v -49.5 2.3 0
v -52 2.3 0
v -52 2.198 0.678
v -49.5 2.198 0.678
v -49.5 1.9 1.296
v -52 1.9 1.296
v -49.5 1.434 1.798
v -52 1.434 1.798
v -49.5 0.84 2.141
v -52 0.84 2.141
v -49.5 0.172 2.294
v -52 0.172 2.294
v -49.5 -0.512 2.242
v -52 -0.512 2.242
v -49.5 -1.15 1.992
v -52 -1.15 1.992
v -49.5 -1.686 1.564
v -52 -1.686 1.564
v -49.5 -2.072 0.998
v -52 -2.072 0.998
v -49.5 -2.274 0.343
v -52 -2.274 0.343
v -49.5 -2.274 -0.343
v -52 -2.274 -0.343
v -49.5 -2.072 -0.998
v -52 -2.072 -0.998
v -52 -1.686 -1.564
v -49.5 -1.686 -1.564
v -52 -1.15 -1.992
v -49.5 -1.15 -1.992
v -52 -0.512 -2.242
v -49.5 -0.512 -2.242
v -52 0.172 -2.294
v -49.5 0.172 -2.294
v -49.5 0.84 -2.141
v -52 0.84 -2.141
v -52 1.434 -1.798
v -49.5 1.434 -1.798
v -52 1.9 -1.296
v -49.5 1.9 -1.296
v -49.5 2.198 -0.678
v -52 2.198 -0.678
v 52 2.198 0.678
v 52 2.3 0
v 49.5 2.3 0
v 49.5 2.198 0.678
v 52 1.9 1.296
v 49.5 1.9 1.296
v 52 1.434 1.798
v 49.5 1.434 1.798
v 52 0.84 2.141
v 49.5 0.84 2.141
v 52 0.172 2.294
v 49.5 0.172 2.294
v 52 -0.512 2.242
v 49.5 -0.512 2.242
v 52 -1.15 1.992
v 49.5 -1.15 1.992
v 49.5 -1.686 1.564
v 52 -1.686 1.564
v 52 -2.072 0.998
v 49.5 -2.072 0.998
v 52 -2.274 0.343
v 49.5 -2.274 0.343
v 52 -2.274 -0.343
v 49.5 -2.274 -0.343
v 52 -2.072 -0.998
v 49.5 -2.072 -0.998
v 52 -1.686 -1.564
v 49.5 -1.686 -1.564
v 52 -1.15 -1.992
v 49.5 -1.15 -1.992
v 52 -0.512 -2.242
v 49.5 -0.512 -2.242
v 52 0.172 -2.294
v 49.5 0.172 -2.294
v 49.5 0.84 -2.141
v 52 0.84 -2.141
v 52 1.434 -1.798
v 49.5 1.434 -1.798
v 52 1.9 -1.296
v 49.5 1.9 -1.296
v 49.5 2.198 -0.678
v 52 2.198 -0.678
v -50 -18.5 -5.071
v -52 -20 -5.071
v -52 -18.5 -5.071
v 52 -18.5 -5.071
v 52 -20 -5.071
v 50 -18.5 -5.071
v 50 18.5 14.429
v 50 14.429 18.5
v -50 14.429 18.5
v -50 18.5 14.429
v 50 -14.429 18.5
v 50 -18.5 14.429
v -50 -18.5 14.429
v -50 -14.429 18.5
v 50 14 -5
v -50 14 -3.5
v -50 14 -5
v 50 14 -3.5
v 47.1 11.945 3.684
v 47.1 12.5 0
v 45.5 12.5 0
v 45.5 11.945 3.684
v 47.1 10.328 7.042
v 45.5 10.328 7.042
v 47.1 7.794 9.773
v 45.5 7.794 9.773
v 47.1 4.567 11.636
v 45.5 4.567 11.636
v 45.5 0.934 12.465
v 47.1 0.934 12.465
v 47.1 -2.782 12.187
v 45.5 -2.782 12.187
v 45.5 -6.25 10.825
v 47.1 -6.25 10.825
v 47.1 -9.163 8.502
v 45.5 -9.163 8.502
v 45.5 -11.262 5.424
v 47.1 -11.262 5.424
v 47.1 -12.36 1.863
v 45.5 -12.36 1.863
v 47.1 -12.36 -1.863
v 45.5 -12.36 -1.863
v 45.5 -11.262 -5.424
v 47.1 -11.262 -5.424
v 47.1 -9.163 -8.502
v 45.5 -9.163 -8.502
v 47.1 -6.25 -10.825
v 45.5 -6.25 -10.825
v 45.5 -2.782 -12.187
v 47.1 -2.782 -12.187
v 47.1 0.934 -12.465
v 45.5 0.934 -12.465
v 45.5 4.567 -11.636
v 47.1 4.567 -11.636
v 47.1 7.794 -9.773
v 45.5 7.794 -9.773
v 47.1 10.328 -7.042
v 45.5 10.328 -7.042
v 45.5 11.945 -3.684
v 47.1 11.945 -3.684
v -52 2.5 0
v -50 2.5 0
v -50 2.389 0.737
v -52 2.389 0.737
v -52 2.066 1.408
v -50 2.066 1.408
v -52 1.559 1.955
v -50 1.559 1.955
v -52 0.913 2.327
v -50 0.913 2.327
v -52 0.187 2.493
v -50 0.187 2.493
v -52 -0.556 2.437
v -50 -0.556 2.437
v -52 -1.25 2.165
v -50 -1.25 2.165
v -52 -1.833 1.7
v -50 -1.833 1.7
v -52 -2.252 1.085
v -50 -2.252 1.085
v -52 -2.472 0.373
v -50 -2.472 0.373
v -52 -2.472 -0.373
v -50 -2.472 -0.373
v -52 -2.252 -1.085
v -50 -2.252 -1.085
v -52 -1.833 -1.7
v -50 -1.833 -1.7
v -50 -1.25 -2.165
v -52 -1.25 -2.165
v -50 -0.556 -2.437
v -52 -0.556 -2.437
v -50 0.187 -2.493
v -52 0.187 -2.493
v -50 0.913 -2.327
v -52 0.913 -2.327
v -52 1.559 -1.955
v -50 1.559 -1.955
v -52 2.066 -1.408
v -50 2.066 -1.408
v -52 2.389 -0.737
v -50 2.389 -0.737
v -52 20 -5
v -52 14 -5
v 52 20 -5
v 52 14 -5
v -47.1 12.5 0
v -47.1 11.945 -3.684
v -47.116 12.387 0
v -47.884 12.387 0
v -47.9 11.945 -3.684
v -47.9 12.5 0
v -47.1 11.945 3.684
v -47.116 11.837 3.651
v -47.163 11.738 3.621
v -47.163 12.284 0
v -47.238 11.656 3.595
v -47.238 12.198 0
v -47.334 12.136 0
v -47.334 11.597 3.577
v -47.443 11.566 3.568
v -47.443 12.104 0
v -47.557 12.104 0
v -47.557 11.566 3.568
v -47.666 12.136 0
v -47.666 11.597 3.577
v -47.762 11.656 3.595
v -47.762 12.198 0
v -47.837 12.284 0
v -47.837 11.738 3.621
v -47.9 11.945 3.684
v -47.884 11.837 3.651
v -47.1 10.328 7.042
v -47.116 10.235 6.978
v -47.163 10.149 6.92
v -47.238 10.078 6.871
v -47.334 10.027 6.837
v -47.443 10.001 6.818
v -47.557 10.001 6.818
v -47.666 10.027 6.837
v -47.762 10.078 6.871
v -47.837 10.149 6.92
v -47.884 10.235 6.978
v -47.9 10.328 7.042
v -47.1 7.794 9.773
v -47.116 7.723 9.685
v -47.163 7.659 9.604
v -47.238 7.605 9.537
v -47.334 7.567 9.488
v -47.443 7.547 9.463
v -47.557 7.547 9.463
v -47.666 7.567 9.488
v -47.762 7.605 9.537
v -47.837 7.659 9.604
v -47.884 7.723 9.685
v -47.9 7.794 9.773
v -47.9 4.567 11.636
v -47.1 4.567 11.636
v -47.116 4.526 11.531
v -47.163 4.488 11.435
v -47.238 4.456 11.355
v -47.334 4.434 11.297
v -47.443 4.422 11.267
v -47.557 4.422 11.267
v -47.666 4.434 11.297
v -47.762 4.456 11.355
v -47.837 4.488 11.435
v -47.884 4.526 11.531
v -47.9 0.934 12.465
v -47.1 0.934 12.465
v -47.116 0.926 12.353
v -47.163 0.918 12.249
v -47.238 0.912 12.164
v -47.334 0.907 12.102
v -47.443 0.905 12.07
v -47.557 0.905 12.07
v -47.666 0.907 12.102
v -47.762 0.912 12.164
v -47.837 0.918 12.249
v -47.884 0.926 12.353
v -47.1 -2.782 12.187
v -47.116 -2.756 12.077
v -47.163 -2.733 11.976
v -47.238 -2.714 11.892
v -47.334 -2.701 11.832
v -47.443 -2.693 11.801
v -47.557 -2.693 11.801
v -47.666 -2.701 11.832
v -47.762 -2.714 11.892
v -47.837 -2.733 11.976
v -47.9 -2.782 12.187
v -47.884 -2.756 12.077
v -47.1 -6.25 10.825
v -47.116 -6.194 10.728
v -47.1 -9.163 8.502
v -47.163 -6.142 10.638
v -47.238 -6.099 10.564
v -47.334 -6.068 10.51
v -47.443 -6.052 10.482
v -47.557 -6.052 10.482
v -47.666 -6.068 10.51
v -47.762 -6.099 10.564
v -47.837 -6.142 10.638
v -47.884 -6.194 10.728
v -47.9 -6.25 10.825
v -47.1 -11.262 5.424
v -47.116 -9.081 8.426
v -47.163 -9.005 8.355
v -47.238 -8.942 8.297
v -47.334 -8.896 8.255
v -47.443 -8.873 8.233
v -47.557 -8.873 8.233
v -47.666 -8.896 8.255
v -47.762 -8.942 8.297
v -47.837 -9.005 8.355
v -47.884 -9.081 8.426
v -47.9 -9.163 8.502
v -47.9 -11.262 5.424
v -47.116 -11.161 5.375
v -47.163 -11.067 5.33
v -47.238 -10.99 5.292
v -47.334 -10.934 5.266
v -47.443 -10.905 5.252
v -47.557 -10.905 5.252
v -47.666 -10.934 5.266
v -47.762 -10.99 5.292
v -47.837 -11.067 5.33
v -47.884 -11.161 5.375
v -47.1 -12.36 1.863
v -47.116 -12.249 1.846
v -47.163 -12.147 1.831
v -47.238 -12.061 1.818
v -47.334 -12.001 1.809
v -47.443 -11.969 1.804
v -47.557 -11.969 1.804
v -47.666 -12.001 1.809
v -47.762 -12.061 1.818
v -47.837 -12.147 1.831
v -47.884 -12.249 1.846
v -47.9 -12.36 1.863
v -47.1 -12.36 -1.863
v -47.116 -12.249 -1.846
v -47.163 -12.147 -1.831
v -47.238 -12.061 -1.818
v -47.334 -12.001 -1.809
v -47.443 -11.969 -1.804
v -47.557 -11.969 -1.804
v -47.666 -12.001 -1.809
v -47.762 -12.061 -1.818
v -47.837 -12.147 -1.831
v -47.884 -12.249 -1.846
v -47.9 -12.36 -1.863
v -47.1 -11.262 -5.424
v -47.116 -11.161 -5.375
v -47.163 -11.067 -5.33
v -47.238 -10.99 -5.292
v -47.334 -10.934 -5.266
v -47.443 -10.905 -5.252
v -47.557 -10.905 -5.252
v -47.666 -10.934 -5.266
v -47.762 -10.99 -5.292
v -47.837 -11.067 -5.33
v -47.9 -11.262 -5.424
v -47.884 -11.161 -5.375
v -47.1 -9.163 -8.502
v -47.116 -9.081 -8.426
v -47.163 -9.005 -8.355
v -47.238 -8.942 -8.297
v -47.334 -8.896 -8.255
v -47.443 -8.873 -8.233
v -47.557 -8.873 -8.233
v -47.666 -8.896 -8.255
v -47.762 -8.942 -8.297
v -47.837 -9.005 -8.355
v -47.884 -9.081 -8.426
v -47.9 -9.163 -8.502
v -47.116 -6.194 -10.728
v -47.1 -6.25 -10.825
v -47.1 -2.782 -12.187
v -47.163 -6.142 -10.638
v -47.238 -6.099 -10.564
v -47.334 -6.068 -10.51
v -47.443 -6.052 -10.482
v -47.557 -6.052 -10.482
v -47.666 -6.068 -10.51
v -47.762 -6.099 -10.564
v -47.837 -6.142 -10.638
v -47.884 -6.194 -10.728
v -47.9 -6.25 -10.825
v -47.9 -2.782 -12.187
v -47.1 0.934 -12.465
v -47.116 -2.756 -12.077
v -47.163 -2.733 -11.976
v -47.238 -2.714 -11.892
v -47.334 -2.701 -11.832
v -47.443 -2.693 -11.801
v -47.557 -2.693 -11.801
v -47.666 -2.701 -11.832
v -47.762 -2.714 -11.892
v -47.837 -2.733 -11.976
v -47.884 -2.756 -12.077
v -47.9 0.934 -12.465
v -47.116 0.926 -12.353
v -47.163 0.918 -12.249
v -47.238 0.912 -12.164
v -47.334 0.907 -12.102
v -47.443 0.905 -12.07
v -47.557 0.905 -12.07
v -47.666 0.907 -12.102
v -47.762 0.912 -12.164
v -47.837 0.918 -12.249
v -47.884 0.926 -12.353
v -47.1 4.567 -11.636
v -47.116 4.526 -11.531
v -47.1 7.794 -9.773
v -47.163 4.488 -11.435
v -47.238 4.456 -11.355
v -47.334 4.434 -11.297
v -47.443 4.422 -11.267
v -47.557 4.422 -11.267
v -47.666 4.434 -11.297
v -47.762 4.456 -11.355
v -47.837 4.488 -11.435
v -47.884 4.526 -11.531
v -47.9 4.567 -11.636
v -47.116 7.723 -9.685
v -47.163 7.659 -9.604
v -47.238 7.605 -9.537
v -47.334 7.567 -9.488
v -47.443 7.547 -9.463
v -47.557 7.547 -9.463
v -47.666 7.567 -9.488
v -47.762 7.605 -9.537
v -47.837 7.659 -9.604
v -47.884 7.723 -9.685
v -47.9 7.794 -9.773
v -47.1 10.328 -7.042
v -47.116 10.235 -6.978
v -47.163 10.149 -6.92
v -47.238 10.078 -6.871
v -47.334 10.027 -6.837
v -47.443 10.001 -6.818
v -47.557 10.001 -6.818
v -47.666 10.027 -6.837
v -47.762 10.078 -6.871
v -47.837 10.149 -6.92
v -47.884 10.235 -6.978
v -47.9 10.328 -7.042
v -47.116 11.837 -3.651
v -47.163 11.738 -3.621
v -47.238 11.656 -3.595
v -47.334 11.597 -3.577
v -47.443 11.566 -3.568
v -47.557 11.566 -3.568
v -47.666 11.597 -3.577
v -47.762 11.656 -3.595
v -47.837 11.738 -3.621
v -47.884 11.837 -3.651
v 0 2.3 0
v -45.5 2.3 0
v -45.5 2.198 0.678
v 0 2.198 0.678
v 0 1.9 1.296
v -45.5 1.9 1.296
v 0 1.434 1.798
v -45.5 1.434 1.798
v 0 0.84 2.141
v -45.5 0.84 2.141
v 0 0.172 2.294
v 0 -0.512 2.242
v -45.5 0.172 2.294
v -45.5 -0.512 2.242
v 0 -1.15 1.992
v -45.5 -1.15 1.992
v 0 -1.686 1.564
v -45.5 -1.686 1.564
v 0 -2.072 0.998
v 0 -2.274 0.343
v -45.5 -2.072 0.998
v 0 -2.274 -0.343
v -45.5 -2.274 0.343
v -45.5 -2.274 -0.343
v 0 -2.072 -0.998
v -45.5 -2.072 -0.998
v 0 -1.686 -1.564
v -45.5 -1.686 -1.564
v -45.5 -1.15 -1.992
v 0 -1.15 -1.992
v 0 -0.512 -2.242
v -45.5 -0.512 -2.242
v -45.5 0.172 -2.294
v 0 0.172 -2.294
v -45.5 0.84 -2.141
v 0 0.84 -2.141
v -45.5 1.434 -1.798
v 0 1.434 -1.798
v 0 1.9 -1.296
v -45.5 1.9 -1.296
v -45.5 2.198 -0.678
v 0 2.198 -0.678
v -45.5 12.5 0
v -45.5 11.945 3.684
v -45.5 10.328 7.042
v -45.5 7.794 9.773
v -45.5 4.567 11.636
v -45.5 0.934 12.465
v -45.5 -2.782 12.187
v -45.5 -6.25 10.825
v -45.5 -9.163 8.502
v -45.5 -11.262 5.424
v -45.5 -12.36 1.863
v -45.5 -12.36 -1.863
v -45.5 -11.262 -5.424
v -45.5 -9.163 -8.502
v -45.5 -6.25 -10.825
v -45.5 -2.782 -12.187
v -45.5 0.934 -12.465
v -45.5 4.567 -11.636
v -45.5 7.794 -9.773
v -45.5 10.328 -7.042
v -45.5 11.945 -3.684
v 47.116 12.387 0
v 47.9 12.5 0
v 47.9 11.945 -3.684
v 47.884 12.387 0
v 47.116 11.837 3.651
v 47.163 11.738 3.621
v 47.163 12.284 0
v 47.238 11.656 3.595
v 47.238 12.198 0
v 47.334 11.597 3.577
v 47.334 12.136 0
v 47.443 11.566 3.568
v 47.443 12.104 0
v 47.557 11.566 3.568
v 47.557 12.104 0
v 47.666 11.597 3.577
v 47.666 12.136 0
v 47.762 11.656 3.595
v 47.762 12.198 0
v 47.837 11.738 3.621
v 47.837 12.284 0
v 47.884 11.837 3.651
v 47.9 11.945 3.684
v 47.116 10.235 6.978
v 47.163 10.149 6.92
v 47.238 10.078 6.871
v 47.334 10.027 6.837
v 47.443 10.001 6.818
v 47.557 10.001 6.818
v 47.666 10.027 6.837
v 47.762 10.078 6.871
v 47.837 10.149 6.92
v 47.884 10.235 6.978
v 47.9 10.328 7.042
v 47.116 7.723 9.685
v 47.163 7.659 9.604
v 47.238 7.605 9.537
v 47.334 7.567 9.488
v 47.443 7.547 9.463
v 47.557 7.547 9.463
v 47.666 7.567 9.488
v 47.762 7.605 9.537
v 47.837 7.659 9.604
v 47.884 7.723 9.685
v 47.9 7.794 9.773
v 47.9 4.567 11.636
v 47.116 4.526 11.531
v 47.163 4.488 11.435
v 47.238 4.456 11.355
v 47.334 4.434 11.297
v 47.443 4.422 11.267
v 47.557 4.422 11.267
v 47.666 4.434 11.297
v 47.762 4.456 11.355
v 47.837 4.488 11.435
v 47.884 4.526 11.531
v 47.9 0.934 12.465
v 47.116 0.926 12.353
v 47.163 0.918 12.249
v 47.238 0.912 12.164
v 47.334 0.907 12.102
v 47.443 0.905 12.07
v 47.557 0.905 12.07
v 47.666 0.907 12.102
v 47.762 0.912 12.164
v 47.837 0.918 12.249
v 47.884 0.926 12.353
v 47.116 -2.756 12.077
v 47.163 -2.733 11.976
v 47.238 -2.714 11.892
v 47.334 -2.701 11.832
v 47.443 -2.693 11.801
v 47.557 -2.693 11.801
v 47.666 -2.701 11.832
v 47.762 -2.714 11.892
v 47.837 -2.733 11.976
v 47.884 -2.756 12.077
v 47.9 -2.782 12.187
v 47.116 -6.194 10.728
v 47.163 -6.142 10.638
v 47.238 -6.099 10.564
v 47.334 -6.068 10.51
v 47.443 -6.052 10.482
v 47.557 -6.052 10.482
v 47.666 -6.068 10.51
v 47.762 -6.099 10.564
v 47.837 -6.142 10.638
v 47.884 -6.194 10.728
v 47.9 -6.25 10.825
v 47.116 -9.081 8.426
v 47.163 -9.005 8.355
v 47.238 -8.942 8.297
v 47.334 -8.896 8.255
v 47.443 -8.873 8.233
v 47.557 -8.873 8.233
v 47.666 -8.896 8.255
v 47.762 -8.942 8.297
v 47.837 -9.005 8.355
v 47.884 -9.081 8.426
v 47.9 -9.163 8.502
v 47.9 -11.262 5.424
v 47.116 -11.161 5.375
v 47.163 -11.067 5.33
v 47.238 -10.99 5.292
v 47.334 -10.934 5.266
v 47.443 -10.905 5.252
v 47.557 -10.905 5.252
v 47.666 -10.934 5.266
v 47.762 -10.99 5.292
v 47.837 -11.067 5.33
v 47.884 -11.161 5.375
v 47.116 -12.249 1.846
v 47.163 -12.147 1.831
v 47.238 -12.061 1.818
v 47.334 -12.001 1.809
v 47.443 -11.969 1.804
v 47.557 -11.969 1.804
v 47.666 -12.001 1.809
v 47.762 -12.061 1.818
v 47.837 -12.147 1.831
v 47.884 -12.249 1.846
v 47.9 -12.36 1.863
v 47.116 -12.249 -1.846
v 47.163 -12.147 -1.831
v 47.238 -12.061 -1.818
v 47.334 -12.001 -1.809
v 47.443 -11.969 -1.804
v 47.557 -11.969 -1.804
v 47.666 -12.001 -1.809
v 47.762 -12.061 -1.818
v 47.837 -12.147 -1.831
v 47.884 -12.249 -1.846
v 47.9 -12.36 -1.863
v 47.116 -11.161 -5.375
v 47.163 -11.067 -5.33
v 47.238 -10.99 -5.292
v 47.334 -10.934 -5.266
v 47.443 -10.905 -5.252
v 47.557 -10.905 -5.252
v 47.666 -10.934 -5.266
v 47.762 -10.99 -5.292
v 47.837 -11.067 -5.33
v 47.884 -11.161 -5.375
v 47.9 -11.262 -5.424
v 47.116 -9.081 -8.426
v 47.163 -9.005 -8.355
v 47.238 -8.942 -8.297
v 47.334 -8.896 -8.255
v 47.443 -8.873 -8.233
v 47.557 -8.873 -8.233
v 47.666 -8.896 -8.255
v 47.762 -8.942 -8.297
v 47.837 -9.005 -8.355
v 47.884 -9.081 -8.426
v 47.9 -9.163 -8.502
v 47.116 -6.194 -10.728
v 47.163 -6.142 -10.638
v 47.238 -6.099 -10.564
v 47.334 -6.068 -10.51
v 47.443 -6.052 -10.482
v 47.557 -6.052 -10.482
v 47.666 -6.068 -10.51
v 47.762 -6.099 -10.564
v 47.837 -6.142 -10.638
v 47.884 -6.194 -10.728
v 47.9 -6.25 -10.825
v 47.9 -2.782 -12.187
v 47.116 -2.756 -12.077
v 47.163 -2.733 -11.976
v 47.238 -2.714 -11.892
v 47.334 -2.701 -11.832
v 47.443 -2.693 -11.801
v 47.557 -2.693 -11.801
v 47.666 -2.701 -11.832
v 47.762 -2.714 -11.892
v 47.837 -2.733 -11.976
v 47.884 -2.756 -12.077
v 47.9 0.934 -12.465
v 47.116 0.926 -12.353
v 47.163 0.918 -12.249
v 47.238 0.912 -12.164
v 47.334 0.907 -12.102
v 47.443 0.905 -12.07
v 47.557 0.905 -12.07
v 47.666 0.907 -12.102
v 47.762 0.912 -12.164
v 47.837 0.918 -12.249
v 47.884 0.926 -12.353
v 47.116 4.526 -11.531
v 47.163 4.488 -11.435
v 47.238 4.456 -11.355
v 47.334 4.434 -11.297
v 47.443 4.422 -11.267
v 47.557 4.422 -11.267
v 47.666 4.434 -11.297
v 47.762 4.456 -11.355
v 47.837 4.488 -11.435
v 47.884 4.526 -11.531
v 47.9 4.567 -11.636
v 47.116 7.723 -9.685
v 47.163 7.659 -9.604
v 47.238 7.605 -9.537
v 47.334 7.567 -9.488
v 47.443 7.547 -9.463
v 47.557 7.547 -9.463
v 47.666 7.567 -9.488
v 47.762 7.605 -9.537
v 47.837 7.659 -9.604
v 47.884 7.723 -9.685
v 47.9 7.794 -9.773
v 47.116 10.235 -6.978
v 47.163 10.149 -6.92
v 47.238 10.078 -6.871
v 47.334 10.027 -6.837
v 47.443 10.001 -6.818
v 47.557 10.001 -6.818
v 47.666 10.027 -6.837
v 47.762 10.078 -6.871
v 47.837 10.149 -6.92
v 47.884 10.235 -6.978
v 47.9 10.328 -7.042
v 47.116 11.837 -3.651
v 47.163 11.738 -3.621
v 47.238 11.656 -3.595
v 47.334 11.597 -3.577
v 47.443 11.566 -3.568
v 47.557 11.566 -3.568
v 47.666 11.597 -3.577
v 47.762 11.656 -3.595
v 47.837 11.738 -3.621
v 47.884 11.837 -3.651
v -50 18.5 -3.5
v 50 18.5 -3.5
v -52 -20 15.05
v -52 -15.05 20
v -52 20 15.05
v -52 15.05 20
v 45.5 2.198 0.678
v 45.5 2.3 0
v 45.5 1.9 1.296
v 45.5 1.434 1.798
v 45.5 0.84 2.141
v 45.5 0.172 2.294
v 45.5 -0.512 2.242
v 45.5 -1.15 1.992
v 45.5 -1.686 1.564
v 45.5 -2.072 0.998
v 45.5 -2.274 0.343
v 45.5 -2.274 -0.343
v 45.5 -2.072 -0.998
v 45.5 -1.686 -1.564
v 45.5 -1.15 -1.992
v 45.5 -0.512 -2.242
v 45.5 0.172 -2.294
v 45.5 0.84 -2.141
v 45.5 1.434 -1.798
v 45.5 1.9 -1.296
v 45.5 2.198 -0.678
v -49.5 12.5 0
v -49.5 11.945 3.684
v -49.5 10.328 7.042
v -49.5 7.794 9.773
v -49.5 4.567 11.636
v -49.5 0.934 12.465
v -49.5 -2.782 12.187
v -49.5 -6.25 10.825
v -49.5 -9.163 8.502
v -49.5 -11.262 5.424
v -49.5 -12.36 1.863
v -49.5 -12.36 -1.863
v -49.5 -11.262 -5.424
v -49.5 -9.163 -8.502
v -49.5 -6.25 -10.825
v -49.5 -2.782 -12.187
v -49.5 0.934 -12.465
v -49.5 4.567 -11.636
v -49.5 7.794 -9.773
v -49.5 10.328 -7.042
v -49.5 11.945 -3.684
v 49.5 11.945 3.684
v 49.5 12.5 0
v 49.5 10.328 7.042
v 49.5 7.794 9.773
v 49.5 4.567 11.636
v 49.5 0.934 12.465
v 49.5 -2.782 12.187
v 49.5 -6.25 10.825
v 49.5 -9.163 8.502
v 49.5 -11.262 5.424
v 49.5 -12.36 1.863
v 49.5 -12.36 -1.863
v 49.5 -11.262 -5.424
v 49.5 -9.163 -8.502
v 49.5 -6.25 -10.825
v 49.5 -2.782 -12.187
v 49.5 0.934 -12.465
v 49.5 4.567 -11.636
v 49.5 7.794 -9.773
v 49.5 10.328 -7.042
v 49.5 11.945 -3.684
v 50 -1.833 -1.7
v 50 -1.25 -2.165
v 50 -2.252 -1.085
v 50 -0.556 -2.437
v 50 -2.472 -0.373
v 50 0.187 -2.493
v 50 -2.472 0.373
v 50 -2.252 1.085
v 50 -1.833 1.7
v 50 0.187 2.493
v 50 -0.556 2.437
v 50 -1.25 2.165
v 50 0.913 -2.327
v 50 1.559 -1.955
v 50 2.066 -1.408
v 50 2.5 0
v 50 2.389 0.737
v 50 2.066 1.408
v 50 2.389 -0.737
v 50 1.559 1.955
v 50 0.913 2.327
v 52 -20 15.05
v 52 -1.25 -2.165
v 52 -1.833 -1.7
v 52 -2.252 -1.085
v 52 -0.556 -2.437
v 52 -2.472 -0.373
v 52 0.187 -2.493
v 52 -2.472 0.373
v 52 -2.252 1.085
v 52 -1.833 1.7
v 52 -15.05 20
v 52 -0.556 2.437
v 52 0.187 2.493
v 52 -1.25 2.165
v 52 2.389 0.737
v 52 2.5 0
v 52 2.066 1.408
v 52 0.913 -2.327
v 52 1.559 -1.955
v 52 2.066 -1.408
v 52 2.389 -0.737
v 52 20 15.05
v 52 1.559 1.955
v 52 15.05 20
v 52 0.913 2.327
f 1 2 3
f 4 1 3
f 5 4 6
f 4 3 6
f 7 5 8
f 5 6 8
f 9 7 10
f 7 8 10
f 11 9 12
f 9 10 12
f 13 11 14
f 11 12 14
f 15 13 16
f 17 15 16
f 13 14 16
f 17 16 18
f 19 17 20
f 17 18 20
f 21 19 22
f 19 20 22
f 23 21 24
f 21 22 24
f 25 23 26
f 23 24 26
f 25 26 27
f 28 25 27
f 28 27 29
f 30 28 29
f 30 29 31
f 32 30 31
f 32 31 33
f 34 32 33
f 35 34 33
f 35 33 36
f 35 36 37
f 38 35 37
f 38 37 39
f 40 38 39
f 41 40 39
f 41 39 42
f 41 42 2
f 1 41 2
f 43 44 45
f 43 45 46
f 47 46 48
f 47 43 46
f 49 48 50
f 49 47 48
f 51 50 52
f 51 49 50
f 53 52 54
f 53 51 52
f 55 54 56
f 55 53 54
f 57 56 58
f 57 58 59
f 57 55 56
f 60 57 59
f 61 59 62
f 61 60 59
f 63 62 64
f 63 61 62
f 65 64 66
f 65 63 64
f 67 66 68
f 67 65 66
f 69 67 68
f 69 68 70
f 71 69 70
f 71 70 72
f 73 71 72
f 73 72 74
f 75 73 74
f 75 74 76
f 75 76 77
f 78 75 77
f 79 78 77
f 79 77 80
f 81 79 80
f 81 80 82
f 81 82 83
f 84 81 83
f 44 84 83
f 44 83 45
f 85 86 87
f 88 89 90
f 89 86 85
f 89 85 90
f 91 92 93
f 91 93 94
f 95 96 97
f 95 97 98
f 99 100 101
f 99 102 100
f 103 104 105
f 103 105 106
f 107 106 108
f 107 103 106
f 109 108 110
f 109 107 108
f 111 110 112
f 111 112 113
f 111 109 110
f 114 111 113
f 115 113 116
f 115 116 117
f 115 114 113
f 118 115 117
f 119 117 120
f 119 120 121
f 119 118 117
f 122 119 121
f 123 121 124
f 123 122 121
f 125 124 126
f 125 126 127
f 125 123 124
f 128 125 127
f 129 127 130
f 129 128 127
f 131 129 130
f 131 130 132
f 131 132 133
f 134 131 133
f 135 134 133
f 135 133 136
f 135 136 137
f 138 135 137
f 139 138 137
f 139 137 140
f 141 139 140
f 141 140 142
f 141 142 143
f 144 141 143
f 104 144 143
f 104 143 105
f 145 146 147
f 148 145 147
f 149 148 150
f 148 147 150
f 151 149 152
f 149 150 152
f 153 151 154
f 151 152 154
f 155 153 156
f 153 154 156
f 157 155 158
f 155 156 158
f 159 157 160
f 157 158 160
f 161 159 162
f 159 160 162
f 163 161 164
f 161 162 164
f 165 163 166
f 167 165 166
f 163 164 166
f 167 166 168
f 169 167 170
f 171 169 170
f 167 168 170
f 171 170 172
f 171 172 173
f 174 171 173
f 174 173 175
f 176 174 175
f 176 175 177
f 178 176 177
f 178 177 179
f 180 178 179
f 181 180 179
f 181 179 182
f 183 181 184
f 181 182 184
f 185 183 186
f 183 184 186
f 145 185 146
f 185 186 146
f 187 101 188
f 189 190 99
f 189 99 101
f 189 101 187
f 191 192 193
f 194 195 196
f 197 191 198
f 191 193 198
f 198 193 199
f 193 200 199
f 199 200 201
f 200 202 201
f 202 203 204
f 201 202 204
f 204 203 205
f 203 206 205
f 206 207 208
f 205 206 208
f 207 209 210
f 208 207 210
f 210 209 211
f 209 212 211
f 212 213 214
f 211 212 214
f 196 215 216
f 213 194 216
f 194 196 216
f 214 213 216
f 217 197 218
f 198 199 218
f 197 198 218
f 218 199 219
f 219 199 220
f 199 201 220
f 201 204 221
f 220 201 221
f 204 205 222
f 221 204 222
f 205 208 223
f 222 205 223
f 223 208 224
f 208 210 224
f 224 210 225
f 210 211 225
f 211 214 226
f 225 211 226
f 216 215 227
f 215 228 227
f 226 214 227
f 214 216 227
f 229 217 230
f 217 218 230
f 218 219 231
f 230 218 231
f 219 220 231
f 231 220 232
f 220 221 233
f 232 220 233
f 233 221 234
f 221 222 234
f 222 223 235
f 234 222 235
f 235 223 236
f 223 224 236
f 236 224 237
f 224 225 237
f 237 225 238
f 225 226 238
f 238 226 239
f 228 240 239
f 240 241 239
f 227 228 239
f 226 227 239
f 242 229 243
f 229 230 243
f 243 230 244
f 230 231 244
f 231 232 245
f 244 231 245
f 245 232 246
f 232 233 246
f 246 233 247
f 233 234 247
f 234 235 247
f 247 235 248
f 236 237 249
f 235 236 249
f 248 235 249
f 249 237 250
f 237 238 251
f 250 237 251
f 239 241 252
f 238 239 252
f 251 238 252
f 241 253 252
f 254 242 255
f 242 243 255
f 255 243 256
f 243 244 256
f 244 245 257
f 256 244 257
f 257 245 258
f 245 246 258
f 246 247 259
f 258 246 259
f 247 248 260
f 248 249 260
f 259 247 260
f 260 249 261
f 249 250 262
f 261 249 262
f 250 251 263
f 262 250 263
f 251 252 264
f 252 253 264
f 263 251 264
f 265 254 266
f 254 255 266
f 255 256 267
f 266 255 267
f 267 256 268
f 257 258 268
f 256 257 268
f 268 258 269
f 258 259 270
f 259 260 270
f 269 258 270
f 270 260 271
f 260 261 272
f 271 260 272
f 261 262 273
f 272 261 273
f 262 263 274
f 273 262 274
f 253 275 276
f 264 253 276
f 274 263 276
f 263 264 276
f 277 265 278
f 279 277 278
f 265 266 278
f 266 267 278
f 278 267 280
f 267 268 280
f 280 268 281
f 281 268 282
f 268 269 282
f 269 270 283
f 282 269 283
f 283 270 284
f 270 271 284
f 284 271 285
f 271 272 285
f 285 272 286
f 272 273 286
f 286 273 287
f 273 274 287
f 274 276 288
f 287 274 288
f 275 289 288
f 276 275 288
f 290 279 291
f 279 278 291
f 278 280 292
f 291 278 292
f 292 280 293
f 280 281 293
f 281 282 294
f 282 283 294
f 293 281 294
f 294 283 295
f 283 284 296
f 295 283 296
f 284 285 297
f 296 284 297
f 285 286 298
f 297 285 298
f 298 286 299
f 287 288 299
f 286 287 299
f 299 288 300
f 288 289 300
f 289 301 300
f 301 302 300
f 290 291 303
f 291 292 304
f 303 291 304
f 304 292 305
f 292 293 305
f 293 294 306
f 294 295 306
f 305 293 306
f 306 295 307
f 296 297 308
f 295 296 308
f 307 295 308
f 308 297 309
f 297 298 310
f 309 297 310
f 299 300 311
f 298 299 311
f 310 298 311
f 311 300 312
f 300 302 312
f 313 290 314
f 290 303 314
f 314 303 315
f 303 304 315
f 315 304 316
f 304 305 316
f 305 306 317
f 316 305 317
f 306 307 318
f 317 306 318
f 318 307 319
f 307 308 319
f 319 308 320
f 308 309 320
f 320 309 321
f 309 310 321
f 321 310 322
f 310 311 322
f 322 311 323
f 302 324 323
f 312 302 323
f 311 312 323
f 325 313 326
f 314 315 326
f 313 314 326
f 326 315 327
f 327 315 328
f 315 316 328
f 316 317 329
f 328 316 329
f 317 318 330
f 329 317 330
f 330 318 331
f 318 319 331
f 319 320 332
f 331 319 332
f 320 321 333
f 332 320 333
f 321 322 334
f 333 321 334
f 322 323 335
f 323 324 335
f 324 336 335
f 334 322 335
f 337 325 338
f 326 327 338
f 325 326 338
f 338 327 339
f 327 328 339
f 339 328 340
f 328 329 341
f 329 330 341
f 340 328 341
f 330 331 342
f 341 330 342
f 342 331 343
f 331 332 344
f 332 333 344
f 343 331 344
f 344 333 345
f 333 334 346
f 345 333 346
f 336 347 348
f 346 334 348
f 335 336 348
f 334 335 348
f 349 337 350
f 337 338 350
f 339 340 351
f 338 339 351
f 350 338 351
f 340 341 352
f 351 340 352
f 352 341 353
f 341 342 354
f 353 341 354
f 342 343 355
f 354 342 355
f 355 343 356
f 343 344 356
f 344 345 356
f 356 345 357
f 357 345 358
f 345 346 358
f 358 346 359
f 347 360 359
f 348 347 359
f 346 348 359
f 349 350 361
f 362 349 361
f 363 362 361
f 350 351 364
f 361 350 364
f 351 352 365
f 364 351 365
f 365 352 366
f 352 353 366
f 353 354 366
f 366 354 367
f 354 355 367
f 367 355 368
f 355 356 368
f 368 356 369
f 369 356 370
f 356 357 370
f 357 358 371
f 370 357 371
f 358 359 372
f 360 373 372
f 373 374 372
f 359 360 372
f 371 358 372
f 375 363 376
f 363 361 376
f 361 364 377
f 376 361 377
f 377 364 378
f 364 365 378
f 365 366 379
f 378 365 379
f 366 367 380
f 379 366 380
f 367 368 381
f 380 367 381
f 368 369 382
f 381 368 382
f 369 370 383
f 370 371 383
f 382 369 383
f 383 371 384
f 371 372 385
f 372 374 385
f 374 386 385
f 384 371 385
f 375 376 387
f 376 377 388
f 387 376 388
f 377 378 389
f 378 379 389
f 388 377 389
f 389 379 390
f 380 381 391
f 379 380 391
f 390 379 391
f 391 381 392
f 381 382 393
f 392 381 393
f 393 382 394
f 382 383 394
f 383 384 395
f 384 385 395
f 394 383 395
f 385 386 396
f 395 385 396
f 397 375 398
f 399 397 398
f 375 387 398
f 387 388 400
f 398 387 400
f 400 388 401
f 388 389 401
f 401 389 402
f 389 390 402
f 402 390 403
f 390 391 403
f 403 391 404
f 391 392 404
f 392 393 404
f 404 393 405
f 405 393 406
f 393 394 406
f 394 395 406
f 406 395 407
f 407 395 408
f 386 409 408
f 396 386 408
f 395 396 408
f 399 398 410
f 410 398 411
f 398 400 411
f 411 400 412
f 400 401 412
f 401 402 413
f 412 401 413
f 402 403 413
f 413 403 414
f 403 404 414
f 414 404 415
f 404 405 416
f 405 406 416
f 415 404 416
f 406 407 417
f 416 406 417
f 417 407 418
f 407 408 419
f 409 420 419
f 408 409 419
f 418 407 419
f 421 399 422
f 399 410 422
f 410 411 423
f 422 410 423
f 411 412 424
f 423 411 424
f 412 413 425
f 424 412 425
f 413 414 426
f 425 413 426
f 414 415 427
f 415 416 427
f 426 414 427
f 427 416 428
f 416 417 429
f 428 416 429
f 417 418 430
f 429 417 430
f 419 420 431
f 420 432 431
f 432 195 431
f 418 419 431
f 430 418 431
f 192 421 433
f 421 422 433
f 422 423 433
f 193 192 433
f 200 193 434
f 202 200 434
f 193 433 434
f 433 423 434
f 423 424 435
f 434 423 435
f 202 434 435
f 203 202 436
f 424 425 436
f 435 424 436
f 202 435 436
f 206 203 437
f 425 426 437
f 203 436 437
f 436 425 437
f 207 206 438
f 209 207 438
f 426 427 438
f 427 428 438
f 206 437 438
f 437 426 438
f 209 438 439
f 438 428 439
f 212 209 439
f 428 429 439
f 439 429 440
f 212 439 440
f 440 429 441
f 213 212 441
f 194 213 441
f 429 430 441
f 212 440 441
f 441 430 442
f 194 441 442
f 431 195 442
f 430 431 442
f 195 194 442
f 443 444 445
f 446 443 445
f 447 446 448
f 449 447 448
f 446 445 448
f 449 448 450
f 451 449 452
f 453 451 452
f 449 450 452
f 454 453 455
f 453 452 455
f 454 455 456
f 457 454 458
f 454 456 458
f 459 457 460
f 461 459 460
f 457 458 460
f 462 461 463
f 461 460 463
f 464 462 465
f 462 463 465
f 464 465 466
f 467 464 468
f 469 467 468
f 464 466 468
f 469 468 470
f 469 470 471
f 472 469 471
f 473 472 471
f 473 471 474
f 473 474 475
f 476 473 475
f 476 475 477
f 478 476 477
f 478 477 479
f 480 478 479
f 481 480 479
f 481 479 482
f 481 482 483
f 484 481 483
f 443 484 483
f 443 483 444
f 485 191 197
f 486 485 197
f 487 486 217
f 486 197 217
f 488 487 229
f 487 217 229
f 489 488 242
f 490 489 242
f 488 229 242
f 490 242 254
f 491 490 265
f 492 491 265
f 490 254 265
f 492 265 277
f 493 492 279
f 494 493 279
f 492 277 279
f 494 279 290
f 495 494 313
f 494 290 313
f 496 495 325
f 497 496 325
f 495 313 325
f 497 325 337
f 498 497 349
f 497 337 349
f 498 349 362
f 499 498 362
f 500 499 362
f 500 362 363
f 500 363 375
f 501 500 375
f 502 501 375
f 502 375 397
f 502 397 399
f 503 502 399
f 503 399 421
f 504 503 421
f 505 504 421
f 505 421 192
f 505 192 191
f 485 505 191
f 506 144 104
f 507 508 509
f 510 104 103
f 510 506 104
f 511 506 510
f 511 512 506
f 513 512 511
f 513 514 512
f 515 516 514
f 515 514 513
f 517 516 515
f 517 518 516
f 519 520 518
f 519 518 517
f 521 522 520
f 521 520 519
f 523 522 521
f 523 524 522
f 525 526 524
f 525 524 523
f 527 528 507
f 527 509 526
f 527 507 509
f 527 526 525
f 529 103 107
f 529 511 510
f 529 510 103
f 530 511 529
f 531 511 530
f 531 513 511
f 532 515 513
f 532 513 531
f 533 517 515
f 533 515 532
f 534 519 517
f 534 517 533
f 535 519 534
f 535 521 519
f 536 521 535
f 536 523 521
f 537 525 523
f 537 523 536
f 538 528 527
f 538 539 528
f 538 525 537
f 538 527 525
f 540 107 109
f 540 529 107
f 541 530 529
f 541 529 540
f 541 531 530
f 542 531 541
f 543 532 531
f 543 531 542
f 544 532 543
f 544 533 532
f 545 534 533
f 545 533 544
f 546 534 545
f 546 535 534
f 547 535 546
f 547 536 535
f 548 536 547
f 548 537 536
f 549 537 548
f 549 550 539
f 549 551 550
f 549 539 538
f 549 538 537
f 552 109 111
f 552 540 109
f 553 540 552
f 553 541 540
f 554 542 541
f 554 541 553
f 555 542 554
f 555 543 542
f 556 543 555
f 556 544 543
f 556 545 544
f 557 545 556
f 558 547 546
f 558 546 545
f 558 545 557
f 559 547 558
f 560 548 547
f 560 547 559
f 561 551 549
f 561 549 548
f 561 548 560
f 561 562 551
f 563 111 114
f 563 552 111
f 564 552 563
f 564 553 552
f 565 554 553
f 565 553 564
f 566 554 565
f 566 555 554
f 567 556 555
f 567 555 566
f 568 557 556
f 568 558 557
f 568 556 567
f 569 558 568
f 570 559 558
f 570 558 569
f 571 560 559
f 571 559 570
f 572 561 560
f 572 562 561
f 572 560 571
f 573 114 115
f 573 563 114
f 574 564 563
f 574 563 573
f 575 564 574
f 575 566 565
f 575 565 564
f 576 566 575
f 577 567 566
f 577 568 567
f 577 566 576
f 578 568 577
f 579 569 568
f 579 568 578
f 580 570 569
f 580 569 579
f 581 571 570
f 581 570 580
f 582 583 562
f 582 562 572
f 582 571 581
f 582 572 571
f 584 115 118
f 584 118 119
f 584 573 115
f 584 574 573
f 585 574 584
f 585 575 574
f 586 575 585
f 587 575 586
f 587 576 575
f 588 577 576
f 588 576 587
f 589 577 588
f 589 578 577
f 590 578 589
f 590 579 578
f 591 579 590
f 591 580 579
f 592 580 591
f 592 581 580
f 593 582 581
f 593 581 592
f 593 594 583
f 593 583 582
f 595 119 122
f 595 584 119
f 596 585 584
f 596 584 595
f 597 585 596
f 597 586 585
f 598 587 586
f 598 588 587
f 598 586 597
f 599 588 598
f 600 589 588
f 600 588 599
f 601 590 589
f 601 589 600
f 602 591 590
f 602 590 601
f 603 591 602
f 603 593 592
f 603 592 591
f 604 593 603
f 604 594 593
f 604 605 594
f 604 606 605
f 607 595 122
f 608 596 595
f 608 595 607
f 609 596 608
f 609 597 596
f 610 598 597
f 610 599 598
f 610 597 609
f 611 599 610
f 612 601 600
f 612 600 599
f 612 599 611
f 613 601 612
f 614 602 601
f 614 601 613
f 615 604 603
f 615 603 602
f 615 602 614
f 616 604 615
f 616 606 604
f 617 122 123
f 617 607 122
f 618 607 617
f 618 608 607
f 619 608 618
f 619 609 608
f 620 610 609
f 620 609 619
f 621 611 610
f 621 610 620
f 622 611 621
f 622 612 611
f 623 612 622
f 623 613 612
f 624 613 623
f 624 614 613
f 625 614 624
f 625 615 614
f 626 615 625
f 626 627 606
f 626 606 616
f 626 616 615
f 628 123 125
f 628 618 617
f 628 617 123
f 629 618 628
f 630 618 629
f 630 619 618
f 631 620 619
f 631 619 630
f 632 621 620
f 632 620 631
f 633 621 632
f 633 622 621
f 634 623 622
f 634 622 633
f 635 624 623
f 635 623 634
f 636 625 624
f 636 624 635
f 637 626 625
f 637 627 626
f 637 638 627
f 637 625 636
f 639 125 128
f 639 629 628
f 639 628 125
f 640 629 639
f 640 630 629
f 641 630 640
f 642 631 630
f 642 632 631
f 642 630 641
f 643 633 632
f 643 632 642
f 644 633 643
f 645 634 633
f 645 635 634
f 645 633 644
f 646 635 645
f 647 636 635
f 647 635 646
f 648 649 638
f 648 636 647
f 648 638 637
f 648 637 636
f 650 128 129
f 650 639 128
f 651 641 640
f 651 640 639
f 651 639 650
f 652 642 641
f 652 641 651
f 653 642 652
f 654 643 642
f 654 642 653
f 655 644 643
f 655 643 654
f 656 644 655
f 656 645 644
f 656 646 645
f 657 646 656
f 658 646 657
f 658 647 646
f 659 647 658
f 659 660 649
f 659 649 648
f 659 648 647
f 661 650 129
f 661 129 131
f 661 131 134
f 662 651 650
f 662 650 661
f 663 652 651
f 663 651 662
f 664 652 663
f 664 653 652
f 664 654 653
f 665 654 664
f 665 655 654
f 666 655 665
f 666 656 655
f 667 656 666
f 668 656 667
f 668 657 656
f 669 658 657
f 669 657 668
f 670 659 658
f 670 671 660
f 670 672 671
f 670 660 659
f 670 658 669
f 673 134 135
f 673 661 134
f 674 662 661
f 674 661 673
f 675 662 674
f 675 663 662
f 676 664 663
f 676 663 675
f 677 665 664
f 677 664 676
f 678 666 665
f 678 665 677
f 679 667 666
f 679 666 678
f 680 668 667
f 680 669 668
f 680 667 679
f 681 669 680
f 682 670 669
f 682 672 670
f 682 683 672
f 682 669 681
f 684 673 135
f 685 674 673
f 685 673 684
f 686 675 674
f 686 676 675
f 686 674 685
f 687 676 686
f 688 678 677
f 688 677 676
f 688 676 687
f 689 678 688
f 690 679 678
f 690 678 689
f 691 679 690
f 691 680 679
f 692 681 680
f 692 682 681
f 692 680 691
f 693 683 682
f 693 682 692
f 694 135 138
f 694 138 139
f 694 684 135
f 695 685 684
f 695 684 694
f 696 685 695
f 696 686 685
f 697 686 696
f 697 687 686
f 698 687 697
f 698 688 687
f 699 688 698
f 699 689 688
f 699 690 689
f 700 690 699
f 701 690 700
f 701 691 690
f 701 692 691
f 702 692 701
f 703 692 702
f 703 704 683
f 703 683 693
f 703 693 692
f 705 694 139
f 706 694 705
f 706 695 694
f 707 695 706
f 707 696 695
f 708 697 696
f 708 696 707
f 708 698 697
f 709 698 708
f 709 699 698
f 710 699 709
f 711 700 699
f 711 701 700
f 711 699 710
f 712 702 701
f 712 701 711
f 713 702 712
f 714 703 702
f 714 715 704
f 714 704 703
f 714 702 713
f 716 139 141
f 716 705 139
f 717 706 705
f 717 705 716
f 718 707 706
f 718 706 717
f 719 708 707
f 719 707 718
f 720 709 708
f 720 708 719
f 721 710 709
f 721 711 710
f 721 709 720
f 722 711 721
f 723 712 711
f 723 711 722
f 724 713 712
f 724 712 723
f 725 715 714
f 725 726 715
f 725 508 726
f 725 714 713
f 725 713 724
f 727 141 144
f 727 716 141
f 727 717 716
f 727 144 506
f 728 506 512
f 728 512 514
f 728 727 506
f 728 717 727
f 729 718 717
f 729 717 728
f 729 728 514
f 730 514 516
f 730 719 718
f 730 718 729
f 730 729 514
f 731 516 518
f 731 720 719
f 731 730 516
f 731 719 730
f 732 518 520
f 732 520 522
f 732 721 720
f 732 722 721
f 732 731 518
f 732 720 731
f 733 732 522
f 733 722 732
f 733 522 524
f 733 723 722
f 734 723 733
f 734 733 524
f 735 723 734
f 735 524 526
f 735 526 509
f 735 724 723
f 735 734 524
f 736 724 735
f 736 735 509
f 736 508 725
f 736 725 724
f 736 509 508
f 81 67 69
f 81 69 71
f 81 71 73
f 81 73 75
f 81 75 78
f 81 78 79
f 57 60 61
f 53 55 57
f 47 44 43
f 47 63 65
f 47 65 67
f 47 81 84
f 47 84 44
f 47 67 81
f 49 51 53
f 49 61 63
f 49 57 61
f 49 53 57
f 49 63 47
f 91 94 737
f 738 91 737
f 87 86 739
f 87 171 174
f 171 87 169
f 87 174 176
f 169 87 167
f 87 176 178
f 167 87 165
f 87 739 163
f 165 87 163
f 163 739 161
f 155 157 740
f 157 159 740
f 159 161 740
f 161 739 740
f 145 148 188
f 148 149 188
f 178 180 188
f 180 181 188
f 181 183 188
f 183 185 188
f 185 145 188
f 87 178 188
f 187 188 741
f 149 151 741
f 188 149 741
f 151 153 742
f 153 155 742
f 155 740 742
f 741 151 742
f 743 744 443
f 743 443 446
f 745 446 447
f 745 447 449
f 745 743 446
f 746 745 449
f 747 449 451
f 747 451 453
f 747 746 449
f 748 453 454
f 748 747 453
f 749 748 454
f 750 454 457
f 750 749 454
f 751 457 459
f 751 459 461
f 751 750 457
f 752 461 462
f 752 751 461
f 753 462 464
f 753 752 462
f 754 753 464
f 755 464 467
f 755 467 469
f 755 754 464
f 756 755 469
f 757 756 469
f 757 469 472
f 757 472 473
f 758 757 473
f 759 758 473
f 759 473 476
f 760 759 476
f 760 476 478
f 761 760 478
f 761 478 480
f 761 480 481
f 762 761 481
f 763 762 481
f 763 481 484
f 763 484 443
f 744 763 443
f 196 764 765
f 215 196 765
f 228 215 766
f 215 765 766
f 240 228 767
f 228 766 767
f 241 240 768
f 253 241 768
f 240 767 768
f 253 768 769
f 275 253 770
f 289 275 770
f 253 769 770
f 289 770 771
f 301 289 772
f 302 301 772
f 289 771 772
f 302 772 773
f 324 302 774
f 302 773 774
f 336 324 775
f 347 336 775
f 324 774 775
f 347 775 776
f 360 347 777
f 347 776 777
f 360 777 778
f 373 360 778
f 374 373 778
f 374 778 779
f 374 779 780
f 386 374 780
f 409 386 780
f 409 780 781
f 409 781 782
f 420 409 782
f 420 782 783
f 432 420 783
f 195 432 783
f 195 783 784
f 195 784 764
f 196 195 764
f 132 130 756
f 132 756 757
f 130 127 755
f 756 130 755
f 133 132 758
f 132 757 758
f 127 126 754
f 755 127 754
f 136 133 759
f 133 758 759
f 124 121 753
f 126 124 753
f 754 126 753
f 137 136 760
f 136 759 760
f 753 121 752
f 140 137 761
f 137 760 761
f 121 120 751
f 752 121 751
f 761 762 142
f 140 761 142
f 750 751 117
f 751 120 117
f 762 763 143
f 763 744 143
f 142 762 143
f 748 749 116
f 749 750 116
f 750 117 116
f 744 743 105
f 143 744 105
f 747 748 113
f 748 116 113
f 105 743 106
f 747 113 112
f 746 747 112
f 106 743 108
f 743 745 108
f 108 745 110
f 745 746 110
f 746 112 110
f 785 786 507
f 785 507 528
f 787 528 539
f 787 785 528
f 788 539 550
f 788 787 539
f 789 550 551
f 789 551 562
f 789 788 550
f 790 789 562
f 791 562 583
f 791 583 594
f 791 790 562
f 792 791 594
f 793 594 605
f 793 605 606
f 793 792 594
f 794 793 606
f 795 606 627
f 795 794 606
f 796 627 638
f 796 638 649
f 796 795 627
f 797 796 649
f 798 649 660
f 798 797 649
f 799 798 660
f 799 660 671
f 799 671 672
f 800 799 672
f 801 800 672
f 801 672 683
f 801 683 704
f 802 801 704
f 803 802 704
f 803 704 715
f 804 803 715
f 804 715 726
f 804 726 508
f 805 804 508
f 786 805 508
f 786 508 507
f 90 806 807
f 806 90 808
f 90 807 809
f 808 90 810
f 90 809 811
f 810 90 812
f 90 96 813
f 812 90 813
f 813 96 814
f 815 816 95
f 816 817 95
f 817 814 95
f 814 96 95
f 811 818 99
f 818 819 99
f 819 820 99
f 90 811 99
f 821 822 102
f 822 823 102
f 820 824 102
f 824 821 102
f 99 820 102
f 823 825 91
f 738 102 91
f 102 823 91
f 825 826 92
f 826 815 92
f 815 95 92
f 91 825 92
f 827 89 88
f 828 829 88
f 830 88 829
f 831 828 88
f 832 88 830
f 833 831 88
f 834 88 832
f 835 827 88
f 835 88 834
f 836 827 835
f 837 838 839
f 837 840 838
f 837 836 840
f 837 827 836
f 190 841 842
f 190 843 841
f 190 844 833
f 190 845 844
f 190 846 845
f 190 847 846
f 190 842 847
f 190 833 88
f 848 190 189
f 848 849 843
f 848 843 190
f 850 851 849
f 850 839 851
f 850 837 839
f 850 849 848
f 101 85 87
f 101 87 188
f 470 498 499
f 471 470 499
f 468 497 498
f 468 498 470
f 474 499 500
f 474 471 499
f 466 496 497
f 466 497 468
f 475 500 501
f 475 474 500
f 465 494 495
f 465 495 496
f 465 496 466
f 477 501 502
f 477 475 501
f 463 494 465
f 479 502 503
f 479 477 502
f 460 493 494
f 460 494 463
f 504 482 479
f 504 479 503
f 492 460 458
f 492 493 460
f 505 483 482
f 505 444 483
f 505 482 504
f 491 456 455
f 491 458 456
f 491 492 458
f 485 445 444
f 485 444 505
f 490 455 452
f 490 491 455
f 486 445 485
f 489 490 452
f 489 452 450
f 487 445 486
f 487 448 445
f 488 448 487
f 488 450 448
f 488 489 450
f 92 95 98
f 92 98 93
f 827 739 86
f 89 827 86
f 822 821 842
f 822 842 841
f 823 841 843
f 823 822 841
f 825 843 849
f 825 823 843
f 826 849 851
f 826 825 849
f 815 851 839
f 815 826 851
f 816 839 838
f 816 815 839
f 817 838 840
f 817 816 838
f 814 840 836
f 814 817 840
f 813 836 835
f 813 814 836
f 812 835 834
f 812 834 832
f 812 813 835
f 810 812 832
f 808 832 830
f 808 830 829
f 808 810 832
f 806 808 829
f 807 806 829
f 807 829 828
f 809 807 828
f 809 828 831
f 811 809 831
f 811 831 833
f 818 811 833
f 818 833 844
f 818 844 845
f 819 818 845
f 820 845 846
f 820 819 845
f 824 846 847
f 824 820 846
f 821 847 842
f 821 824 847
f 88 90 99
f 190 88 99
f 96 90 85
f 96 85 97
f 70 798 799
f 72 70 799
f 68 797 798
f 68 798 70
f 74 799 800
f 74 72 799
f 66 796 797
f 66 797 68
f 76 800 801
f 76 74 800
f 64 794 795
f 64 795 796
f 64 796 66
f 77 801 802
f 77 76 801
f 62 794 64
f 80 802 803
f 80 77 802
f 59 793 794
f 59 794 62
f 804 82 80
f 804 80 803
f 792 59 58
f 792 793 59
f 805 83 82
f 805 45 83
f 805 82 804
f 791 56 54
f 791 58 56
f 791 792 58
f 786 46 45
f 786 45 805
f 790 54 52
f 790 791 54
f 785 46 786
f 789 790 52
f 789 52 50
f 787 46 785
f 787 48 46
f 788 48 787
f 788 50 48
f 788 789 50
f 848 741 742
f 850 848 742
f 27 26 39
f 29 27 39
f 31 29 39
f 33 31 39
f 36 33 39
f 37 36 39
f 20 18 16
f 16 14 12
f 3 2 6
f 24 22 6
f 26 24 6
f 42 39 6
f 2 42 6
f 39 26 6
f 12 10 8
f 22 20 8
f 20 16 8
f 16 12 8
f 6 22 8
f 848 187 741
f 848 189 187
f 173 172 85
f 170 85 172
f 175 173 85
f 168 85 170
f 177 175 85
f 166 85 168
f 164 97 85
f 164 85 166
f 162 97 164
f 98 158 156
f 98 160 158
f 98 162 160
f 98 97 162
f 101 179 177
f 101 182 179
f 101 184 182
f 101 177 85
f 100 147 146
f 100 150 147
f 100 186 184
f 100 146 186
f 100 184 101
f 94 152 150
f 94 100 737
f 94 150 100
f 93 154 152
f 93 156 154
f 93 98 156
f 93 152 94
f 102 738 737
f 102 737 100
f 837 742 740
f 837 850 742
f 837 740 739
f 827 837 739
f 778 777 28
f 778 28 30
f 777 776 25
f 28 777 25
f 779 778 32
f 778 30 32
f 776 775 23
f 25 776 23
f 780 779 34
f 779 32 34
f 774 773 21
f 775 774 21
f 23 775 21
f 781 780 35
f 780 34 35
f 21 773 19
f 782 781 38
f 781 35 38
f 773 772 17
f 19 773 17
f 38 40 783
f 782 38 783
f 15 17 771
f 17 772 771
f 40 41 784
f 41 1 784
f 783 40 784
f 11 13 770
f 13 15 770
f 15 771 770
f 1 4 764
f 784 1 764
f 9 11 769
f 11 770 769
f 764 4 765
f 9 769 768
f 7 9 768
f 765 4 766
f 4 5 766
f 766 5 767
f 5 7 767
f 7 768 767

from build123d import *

# Parameters (mm, degrees)
F1_DEPTH = 50
F2_R     = 2.5
F3_DEPTH = 2
F4_R     = 2.3
F5_DEPTH = 52
F7_R     = 12.5
F8_DEPTH = 4


with BuildPart() as f1:
    # F0 (on Right) → F1 (new body)
    with BuildSketch(Plane.YZ):
        Polygon((15.0502525317, 20), (0, 20), (-15.0502525317, 20), (-20, 15.0502525317), (-20, -5.0710678119), (-18.5, -5.0710678119), (-18.5, 14.4289321881), (-14.4289321881, 18.5), (0.0710678119, 18.5), (14.4289321881, 18.5), (18.5, 14.4289321881), (18.5, -3.5), (14, -3.5), (14, -5), (20, -5), (20, 15.0502525317), align=None)
    extrude(amount=F1_DEPTH)

    # F2 (on face) → F3 (join)
    with BuildSketch(Plane.YZ.offset(50)):
        Polygon((-20, 15.0502525317), (-20, -5.0710678119), (-18.5, -5.0710678119), (14, -5), (20, -5), (20, 15.0502525317), (15.0502525317, 20), (0, 20), (-15.0502525317, 20), align=None)
        Circle(F2_R, mode=Mode.SUBTRACT)
    extrude(amount=F3_DEPTH)

    # F14: F1 across plane


with BuildPart() as f5:
    # F4 (on face) → F5 (new body)
    with BuildSketch(Plane.YZ.offset(52)):
        Circle(F4_R)
    extrude(amount=-F5_DEPTH)

    # F7 (on offset) → F8 (join)
    with BuildSketch(Plane.YZ.offset(49.5)):
        Circle(F7_R)
    extrude(amount=-F8_DEPTH)

    # F10 (on offset) → F13 (revolve, cut)
    with BuildSketch(Plane.XY):
        with BuildLine():
            Line((47.9, 12.5), (47.1, 12.5))
            ThreePointArc((47.1, 12.5), (47.5, 12.1), (47.9, 12.5))
        make_face()
    revolve(axis=Axis((21.459730342, 0, 0), (1, 0, 0)), mode=Mode.SUBTRACT)

    # F15: F5 across plane


with BuildPart() as f1_1:
    add(f1.part)
    add(f1.part.mirror(Plane.YZ))


with BuildPart() as f5_1:
    add(f5.part)
    add(f5.part.mirror(Plane.YZ))


solid = Compound([f1_1.part, f5_1.part])
